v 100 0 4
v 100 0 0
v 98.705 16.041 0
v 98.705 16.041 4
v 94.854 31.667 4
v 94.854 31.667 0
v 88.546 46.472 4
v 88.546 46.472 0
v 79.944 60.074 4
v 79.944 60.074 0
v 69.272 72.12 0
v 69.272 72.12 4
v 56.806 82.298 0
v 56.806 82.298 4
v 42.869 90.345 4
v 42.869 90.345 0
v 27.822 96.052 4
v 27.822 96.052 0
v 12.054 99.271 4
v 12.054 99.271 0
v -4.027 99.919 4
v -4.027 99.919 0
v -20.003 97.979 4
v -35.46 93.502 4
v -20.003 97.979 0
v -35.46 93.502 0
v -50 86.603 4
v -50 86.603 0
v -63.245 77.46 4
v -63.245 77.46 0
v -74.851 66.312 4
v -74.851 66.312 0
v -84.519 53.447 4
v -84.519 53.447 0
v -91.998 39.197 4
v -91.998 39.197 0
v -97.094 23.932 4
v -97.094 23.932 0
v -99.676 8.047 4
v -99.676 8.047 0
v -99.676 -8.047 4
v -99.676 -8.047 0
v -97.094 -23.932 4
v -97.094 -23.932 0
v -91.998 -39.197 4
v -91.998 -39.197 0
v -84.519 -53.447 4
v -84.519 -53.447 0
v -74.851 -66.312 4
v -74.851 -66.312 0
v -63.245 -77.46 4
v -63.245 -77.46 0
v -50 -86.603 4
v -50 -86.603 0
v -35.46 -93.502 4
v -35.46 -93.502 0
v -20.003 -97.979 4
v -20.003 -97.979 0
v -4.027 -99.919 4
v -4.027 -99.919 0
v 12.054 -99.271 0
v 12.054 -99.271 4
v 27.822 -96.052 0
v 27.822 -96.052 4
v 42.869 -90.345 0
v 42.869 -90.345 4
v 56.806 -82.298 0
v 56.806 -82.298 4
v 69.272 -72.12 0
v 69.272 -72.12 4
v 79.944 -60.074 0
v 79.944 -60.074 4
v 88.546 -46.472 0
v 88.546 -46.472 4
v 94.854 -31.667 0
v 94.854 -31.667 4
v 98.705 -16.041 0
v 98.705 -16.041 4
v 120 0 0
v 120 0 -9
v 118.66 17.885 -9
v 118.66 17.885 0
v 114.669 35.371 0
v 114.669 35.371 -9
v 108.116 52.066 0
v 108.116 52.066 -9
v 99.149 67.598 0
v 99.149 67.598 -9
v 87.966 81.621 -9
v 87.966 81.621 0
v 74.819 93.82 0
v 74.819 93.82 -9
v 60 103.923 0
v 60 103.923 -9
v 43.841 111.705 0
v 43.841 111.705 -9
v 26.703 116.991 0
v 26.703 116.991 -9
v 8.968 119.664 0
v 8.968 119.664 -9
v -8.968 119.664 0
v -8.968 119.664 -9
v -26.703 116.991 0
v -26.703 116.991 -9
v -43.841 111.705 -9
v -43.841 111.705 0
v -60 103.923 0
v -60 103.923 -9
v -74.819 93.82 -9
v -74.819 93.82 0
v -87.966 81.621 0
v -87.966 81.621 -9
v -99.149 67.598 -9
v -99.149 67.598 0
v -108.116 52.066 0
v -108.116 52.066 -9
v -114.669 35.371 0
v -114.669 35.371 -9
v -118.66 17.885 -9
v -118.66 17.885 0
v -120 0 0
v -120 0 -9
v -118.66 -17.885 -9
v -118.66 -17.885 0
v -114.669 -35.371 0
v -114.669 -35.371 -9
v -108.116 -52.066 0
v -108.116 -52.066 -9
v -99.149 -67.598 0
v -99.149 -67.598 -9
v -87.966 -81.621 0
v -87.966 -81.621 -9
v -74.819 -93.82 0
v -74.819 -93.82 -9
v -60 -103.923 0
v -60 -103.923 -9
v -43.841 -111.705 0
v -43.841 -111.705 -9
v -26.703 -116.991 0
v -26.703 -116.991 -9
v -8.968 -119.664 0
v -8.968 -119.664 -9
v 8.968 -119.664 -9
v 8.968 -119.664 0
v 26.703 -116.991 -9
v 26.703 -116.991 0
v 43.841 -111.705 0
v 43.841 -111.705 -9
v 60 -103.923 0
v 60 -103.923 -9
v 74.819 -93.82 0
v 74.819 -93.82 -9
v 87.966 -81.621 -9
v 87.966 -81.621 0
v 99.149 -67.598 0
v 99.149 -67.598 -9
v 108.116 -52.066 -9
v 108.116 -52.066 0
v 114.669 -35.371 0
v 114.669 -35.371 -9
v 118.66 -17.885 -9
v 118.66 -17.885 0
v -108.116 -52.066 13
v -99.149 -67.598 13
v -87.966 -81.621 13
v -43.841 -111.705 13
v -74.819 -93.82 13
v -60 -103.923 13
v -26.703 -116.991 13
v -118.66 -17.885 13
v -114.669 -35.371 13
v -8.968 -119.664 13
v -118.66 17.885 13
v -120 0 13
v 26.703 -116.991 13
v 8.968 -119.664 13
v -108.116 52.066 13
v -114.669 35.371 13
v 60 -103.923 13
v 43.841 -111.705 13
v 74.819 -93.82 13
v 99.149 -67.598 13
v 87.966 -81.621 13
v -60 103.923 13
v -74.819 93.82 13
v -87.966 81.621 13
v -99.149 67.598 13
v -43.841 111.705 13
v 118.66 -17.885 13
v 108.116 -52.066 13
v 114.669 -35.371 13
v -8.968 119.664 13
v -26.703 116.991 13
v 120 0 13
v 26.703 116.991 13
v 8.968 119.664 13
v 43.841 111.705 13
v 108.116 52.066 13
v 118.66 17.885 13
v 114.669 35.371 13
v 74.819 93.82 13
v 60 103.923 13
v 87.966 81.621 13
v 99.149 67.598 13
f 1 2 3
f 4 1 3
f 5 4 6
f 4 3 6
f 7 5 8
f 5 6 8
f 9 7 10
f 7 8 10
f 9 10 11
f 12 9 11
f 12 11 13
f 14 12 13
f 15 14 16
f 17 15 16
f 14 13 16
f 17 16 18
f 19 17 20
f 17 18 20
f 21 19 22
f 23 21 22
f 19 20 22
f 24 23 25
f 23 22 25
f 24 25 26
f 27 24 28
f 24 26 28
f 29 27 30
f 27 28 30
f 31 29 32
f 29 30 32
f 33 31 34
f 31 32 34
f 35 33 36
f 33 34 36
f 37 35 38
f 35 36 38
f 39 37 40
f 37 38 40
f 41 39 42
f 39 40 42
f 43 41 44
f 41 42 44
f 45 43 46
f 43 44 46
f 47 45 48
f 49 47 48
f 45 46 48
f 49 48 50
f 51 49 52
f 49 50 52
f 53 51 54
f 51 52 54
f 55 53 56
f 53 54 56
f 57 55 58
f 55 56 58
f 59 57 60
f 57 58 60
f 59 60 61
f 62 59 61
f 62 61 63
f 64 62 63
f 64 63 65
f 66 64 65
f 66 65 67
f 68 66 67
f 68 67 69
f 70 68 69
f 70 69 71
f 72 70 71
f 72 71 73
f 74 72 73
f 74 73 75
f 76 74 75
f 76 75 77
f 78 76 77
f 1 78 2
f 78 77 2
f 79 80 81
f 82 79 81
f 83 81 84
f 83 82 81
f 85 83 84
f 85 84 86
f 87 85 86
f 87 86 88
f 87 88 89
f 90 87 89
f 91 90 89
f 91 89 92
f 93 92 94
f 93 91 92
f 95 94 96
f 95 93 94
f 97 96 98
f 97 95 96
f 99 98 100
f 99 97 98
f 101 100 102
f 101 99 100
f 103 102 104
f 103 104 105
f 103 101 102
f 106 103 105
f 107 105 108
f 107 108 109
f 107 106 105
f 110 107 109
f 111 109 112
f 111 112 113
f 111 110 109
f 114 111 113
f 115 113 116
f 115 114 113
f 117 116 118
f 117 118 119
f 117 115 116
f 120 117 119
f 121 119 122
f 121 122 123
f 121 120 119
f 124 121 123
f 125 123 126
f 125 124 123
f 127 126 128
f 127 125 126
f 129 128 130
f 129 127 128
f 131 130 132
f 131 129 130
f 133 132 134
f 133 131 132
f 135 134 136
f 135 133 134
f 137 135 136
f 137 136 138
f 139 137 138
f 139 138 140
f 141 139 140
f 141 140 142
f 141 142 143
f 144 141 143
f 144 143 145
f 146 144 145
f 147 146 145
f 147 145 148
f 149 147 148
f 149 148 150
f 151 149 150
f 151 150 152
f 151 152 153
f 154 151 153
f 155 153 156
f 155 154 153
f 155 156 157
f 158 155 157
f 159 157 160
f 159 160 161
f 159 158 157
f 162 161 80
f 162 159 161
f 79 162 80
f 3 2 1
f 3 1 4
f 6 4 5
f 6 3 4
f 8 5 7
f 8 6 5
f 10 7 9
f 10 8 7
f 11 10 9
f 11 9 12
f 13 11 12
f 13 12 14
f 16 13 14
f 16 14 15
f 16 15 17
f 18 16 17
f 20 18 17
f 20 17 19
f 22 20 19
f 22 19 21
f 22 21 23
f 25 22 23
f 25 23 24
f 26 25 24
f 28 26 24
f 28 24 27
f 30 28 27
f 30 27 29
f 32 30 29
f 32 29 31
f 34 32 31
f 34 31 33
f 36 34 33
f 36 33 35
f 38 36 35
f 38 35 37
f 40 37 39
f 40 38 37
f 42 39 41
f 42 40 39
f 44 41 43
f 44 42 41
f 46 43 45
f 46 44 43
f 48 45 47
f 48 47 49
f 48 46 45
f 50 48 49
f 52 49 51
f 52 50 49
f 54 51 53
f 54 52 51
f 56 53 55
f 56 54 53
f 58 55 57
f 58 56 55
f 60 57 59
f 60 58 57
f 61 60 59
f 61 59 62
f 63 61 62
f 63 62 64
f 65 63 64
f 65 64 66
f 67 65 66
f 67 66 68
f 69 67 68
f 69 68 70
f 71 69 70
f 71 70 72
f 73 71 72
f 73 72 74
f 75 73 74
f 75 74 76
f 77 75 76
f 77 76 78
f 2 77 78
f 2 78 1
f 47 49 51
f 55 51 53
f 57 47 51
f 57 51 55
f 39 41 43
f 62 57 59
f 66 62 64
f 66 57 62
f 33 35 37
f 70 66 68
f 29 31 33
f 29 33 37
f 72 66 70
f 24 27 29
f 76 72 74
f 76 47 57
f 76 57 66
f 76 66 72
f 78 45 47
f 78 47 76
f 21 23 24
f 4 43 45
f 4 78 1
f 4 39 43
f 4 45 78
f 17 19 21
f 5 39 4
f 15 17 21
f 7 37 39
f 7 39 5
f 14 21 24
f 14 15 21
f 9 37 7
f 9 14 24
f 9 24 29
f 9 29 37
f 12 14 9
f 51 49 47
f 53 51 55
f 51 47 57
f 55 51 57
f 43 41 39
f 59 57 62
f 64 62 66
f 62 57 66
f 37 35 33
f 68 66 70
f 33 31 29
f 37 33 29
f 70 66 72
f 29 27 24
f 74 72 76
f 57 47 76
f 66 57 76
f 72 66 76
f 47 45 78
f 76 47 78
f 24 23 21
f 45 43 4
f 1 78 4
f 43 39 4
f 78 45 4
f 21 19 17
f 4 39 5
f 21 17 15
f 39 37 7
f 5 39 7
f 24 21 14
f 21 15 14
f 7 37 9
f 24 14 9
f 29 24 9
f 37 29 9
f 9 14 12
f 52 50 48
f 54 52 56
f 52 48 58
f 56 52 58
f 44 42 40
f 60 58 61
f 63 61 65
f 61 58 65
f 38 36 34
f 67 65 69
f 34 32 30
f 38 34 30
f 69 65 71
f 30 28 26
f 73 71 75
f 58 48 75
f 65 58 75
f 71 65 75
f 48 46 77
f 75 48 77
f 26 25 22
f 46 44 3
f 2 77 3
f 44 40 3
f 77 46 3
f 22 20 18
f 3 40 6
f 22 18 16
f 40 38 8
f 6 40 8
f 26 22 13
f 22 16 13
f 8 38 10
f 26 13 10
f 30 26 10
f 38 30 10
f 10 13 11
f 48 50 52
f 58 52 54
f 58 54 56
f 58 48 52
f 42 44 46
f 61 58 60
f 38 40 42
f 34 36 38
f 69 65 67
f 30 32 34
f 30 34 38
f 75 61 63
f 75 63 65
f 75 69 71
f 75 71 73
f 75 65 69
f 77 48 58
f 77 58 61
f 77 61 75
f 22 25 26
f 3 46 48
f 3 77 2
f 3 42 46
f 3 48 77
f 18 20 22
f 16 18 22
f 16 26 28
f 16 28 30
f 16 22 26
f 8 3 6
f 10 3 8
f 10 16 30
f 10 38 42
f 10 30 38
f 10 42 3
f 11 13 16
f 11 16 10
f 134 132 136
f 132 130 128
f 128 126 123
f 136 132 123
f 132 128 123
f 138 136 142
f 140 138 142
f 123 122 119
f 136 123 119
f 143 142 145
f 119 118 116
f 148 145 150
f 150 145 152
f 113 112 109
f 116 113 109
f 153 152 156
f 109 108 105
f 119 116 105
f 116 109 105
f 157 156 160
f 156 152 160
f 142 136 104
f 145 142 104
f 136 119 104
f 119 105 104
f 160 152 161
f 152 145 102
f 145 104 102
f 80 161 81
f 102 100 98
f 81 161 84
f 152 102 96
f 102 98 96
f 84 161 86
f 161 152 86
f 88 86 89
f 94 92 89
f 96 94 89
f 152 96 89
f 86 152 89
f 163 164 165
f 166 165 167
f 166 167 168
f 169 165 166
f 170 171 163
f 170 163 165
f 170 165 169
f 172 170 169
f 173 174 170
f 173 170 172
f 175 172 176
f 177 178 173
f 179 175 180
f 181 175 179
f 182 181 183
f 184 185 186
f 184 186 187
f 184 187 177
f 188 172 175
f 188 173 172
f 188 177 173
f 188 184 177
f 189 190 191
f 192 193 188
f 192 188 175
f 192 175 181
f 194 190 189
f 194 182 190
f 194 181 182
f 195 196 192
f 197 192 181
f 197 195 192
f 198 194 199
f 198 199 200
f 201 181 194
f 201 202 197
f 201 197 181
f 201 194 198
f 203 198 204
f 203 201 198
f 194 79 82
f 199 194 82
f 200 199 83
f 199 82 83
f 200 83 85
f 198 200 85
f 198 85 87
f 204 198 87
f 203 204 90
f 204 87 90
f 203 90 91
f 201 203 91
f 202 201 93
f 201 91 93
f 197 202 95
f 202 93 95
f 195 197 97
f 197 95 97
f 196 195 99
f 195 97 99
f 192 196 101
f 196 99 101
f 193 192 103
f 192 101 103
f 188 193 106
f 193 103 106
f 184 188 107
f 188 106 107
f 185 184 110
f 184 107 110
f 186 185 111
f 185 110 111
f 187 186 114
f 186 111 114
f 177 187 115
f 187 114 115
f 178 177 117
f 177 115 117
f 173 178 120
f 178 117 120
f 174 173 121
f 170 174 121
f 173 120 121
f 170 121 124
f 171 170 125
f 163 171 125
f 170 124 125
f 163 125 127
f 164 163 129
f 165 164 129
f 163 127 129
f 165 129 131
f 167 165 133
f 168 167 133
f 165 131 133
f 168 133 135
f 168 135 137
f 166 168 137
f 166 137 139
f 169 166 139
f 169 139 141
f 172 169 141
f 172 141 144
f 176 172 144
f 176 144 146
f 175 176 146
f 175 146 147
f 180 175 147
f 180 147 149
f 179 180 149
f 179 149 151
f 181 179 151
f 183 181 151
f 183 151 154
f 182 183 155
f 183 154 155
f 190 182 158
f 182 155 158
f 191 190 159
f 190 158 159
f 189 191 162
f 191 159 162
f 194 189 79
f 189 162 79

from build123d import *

# Parameters (mm, degrees)
F0_R     = 120
F0_R_2   = 100
F1_DEPTH = 9
F2_DEPTH = 4
F3_DEPTH = 13
F4_DEPTH = 9


with BuildPart() as f1:
    # F0 (on Top) → F1 (new body)
    with BuildSketch(Plane.XY):
        Circle(F0_R)
        Circle(F0_R_2, mode=Mode.SUBTRACT)
        Circle(F0_R_2)
    extrude(amount=-F1_DEPTH)

    # F0 (on Top) → F3 (join)
    with BuildSketch(Plane.XY):
        Circle(F0_R)
        Circle(F0_R_2, mode=Mode.SUBTRACT)
    extrude(amount=F3_DEPTH)



with BuildPart() as f2:
    # F0 (on Top) → F2 (new body)
    with BuildSketch(Plane.XY):
        Circle(F0_R_2)
    extrude(amount=F2_DEPTH)


with BuildPart() as f1_1:
    add(f1.part)
    # F4 (add): a face of the model
    f4_faces = [f2.part.faces().sort_by_distance(p)[0] for p in [
        (0, 0, 4),
    ]]
    extrude(f4_faces, amount=F4_DEPTH)


solid = Compound([f2.part, f1_1.part])
